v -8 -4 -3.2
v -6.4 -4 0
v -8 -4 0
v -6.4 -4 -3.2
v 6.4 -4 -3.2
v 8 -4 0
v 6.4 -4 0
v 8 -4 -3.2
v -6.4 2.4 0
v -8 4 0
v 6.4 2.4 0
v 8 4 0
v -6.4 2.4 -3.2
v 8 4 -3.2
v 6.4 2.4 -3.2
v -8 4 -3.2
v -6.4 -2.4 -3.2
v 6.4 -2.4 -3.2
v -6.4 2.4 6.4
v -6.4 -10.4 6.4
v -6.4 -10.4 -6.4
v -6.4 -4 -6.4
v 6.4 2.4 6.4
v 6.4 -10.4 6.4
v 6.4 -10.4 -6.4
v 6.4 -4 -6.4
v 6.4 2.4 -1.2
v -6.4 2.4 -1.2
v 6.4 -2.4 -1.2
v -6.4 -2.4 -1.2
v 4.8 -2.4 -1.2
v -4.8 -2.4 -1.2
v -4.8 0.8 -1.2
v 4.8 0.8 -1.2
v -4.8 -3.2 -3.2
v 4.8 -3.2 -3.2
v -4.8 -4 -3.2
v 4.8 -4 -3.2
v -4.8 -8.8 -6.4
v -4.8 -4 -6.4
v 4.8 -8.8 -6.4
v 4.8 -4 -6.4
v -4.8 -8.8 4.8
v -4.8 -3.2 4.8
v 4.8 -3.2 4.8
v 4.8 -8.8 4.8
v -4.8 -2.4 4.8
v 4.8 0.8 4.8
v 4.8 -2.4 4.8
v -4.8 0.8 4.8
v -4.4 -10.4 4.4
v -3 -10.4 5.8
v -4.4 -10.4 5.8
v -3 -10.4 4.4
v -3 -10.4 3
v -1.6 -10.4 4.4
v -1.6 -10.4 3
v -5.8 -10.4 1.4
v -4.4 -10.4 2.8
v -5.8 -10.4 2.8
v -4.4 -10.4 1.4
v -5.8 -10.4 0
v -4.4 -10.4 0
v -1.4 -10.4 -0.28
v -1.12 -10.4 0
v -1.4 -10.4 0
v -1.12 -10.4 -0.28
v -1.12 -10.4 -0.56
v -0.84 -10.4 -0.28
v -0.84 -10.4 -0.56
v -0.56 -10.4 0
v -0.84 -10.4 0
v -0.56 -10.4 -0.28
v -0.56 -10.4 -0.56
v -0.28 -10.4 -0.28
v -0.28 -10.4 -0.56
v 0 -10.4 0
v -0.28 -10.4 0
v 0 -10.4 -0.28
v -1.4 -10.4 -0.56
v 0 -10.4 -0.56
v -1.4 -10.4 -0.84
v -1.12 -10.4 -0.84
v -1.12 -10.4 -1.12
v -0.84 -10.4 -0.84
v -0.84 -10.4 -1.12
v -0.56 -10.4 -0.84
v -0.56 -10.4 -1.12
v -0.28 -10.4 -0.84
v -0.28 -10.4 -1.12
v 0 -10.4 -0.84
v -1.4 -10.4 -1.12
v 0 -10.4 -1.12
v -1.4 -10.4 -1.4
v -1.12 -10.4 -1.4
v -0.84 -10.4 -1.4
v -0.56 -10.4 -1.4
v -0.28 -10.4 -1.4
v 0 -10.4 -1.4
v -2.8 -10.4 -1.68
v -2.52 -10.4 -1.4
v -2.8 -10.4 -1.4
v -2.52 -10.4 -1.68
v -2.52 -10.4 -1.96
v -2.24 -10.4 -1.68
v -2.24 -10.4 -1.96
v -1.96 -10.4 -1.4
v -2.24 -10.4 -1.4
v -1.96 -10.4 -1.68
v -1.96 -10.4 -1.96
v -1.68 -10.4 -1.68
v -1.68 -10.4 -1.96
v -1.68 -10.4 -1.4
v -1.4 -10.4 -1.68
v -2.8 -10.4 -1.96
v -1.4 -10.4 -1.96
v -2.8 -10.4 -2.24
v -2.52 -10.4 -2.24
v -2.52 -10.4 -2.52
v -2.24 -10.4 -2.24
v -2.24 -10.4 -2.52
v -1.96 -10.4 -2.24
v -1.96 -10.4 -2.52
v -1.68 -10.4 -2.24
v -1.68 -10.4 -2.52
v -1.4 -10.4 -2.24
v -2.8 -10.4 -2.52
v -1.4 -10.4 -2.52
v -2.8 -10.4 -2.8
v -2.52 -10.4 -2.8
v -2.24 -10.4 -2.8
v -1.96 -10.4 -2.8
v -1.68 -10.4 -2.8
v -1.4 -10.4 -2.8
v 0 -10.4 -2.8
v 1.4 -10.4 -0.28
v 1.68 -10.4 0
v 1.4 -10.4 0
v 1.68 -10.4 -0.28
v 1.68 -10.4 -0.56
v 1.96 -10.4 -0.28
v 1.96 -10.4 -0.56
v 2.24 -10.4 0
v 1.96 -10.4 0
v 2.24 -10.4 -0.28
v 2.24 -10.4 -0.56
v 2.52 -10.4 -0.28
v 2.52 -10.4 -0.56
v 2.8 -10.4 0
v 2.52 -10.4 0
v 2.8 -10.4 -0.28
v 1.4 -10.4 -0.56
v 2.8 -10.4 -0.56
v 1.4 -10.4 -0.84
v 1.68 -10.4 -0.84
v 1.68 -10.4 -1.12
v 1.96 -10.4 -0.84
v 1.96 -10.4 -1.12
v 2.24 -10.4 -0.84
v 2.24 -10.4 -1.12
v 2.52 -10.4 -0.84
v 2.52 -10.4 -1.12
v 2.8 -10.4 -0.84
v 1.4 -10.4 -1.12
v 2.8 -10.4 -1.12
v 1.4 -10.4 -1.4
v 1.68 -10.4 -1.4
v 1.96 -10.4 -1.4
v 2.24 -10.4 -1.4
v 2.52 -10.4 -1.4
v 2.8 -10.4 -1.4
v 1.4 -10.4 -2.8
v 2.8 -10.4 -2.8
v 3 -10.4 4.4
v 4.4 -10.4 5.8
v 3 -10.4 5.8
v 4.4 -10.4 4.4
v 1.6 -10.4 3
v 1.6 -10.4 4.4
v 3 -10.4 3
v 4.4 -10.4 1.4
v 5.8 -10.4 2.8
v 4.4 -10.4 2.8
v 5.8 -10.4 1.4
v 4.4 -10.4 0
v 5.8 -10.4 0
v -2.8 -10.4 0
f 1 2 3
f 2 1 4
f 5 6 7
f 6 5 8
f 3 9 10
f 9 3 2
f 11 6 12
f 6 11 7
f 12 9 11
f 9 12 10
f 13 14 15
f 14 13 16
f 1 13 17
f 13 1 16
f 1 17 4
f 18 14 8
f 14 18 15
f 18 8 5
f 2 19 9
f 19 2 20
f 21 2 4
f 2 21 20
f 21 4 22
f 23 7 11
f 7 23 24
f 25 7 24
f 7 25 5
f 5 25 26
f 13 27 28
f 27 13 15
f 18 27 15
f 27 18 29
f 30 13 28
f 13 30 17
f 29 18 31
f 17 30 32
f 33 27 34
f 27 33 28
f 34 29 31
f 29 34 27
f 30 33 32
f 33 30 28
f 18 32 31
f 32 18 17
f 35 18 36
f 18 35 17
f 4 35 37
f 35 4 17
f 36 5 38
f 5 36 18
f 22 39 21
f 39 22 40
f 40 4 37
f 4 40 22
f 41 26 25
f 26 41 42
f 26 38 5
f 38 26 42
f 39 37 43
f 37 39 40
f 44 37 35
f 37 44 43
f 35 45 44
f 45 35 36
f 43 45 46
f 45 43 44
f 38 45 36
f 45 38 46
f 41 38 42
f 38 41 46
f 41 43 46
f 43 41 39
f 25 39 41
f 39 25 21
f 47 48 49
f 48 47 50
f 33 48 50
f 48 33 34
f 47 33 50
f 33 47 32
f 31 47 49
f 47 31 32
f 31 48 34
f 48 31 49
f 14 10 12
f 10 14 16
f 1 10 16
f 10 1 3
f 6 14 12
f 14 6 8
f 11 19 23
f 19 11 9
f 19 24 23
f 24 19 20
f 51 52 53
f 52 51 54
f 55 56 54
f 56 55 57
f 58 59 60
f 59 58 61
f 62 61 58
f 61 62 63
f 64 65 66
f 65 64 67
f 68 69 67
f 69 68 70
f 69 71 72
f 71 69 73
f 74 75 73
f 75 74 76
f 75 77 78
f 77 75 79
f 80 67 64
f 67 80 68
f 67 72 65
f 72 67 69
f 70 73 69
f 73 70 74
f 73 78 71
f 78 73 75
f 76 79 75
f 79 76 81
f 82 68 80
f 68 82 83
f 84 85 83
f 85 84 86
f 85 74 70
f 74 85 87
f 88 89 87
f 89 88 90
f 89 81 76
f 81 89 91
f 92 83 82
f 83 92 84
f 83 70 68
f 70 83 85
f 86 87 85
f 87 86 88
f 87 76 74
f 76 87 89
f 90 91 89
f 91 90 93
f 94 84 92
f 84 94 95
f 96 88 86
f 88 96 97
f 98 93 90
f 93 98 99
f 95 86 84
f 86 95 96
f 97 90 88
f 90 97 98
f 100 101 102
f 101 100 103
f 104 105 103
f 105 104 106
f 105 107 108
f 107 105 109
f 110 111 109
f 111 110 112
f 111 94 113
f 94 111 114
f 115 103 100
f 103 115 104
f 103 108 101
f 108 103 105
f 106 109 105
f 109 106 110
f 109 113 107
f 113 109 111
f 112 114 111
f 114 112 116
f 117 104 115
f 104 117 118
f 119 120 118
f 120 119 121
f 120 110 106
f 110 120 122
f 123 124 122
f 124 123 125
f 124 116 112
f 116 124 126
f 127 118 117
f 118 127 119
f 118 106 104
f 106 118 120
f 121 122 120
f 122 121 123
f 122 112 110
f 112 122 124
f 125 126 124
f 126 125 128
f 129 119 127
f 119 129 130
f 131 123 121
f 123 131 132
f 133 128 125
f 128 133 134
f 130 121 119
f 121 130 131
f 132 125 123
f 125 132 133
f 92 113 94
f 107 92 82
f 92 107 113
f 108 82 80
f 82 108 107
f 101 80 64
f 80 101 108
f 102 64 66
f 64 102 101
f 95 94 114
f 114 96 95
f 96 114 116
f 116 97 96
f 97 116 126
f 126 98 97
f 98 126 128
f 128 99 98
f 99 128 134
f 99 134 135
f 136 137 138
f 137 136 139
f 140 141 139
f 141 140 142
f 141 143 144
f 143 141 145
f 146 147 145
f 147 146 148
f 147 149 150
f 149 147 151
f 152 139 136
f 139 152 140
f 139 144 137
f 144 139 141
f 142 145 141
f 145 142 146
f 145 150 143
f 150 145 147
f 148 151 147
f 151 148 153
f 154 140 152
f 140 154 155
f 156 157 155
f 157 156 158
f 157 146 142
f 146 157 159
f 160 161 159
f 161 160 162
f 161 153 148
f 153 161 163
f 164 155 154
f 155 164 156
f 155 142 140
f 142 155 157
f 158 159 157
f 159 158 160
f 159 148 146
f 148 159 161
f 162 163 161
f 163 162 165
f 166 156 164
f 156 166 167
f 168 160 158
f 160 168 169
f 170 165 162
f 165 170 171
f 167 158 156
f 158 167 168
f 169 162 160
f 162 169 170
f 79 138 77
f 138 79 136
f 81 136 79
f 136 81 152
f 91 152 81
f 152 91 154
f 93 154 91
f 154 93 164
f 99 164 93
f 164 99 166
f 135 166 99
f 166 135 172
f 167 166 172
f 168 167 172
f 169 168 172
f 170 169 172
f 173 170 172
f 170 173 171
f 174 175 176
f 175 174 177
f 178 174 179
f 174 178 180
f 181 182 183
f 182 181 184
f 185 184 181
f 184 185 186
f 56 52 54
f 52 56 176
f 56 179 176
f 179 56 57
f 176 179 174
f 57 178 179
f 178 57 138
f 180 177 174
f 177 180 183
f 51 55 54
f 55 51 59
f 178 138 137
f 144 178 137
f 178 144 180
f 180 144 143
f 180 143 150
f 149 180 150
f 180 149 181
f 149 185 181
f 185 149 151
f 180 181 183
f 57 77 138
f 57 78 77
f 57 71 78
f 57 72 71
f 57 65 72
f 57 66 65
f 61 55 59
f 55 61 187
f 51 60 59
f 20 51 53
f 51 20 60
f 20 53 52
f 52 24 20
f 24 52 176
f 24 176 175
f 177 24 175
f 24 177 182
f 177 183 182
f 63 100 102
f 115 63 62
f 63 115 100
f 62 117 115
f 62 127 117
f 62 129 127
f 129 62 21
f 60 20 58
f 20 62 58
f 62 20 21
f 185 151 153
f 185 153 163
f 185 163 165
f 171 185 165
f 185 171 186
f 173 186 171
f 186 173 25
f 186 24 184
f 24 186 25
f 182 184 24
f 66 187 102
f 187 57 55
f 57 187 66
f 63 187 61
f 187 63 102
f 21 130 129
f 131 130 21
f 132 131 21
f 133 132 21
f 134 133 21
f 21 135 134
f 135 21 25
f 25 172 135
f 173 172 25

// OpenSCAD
// file: ../p/rect3.scad
use <../lib.scad>
function ldraw_lib__rect3() = [
// 0 Rectangle with 3 Edges
// 0 Name: rect3.dat
// 0 Author: Mark Kennedy [mkennedy]
// 0 !LDRAW_ORG Primitive UPDATE 2010-01
// 0 !LICENSE Licensed under CC BY 4.0 : see CAreadme.txt
// 
// 0 BFC CERTIFY CCW
  [0,"BFC","CERTIFY"],
  [0,"BFC","CCW"],
// 
// 0 !HISTORY 2003-08-01 [PTadmin] Official Update 2003-02
// 0 !HISTORY 2007-06-24 [PTadmin] Header formatted for Contributor Agreement
// 0 !HISTORY 2008-07-01 [PTadmin] Official Update 2008-01
// 0 !HISTORY 2010-01-17 [mikeheide] Change winding to CCW
// 0 !HISTORY 2010-04-05 [PTadmin] Official Update 2010-01
// 
// 
// 2 24 1 0 1 -1 0 1
  [2,24,1,0,1,-1,0,1],
// 2 24 1 0 1 1 0 -1
  [2,24,1,0,1,1,0,-1],
// 2 24 -1 0 1 -1 0 -1
  [2,24,-1,0,1,-1,0,-1],
// 4 16 -1 0 1 -1 0 -1 1 0 -1 1 0 1
  [4,16,-1,0,1,-1,0,-1,1,0,-1,1,0,1],
// 0 //
];
module ldraw_lib__rect3(step=0, col=false, unit=2/5, alt=false, line=0.2, solid=!$preview)
    makepoly(ldraw_lib__rect3(), step=step, col=col, unit=unit, alt=alt, line=line, solid=solid);
ldraw_lib__rect3(line=0.2);
// file: ../p/rect.scad
use <../lib.scad>
function ldraw_lib__rect() = [
// 0 Rectangle
// 0 Name: rect.dat
// 0 Author: James Jessiman
// 0 !LDRAW_ORG Primitive UPDATE 2010-01
// 0 !LICENSE Licensed under CC BY 4.0 : see CAreadme.txt
// 
// 0 BFC CERTIFY CCW
  [0,"BFC","CERTIFY"],
  [0,"BFC","CCW"],
// 
// 0 !HISTORY 2002-04-05 [hafhead] Added BFC statement
// 0 !HISTORY 2002-04-25 [PTadmin] Official Update 2002-02
// 0 !HISTORY 2007-06-24 [PTadmin] Header formatted for Contributor Agreement
// 0 !HISTORY 2008-07-01 [PTadmin] Official Update 2008-01
// 0 !HISTORY 2010-01-17 [mikeheide] changed winding to CCW
// 0 !HISTORY 2010-04-05 [PTadmin] Official Update 2010-01
// 
// 
// 2 24 1 0 1 -1 0 1
  [2,24,1,0,1,-1,0,1],
// 2 24 -1 0 1 -1 0 -1
  [2,24,-1,0,1,-1,0,-1],
// 2 24 -1 0 -1 1 0 -1
  [2,24,-1,0,-1,1,0,-1],
// 2 24 1 0 -1 1 0 1
  [2,24,1,0,-1,1,0,1],
// 4 16 -1 0 1 -1 0 -1 1 0 -1 1 0 1
  [4,16,-1,0,1,-1,0,-1,1,0,-1,1,0,1],
// 0
];
module ldraw_lib__rect(step=0, col=false, unit=2/5, alt=false, line=0.2, solid=!$preview)
    makepoly(ldraw_lib__rect(), step=step, col=col, unit=unit, alt=alt, line=line, solid=solid);
ldraw_lib__rect(line=0.2);
// file: ../p/box5-1.scad
use <../lib.scad>
function ldraw_lib__box5_1() = [
// 0 Box with 5 Faces without 1 Edge
// 0 Name: box5-1.dat
// 0 Author: J.C. Tchang [tchang]
// 0 !LDRAW_ORG Primitive UPDATE 2014-01
// 0 !LICENSE Licensed under CC BY 4.0 : see CAreadme.txt
// 
// 0 BFC CERTIFY CCW
  [0,"BFC","CERTIFY"],
  [0,"BFC","CCW"],
// 
// 0 !HISTORY 2014-06-21 [PTadmin] Official Update 2014-01
// 
// 
// 2 24 1 1 1 -1 1 1
  [2,24,1,1,1,-1,1,1],
// 2 24 -1 1 1 -1 1 -1
  [2,24,-1,1,1,-1,1,-1],
// 2 24 -1 1 -1 1 1 -1
  [2,24,-1,1,-1,1,1,-1],
// 2 24 1 1 -1 1 1 1
  [2,24,1,1,-1,1,1,1],
// 2 24 1 0 1 -1 0 1
  [2,24,1,0,1,-1,0,1],
// 2 24 -1 0 1 -1 0 -1
  [2,24,-1,0,1,-1,0,-1],
// 2 24 1 0 -1 1 0 1
  [2,24,1,0,-1,1,0,1],
// 2 24 1 0 1 1 1 1
  [2,24,1,0,1,1,1,1],
// 2 24 -1 0 1 -1 1 1
  [2,24,-1,0,1,-1,1,1],
// 2 24 1 0 -1 1 1 -1
  [2,24,1,0,-1,1,1,-1],
// 2 24 -1 0 -1 -1 1 -1
  [2,24,-1,0,-1,-1,1,-1],
// 4 16 -1 1 1 1 1 1 1 1 -1 -1 1 -1
  [4,16,-1,1,1,1,1,1,1,1,-1,-1,1,-1],
// 4 16 -1 1 1 -1 0 1 1 0 1 1 1 1
  [4,16,-1,1,1,-1,0,1,1,0,1,1,1,1],
// 4 16 -1 1 -1 -1 0 -1 -1 0 1 -1 1 1
  [4,16,-1,1,-1,-1,0,-1,-1,0,1,-1,1,1],
// 4 16 1 1 -1 1 0 -1 -1 0 -1 -1 1 -1
  [4,16,1,1,-1,1,0,-1,-1,0,-1,-1,1,-1],
// 4 16 1 1 1 1 0 1 1 0 -1 1 1 -1
  [4,16,1,1,1,1,0,1,1,0,-1,1,1,-1],
];
module ldraw_lib__box5_1(step=0, col=false, unit=2/5, alt=false, line=0.2, solid=!$preview)
    makepoly(ldraw_lib__box5_1(), step=step, col=col, unit=unit, alt=alt, line=line, solid=solid);
ldraw_lib__box5_1(line=0.2);
// file: ../p/box3u2p.scad
use <../lib.scad>
function ldraw_lib__box3u2p() = [
// 0 Box with 3 Faces without 2 Parallel Edges
// 0 Name: box3u2p.dat
// 0 Author: Niels Karsdorp [nielsk]
// 0 !LDRAW_ORG Primitive UPDATE 2012-01
// 0 !LICENSE Licensed under CC BY 4.0 : see CAreadme.txt
// 
// 0 BFC CERTIFY CCW
  [0,"BFC","CERTIFY"],
  [0,"BFC","CCW"],
// 
// 0 !HISTORY 2003-03-12 [PTadmin] Official Update 2003-01
// 0 !HISTORY 2007-06-24 [PTadmin] Header formatted for Contributor Agreement
// 0 !HISTORY 2008-07-01 [PTadmin] Official Update 2008-01
// 0 !HISTORY 2012-02-16 [Philo] Changed to CCW
// 0 !HISTORY 2012-03-30 [PTadmin] Official Update 2012-01
// 
// 
// 2 24 1 1 1 -1 1 1
  [2,24,1,1,1,-1,1,1],
// 2 24 -1 1 -1 1 1 -1
  [2,24,-1,1,-1,1,1,-1],
// 2 24 1 0 1 -1 0 1
  [2,24,1,0,1,-1,0,1],
// 2 24 -1 0 -1 1 0 -1
  [2,24,-1,0,-1,1,0,-1],
// 2 24 1 1 1 1 1 -1
  [2,24,1,1,1,1,1,-1],
// 2 24 -1 1 1 -1 1 -1
  [2,24,-1,1,1,-1,1,-1],
// 2 24 1 1 1 1 0 1
  [2,24,1,1,1,1,0,1],
// 2 24 1 1 -1 1 0 -1
  [2,24,1,1,-1,1,0,-1],
// 2 24 -1 1 1 -1 0 1
  [2,24,-1,1,1,-1,0,1],
// 2 24 -1 1 -1 -1 0 -1
  [2,24,-1,1,-1,-1,0,-1],
// 4 16 -1 1 -1 -1 1 1 1 1 1 1 1 -1
  [4,16,-1,1,-1,-1,1,1,1,1,1,1,1,-1],
// 4 16 -1 1 1 -1 0 1 1 0 1 1 1 1
  [4,16,-1,1,1,-1,0,1,1,0,1,1,1,1],
// 4 16 1 1 -1 1 0 -1 -1 0 -1 -1 1 -1
  [4,16,1,1,-1,1,0,-1,-1,0,-1,-1,1,-1],
];
module ldraw_lib__box3u2p(step=0, col=false, unit=2/5, alt=false, line=0.2, solid=!$preview)
    makepoly(ldraw_lib__box3u2p(), step=step, col=col, unit=unit, alt=alt, line=line, solid=solid);
ldraw_lib__box3u2p(line=0.2);
// file: ../p/box2-5.scad
use <../lib.scad>
function ldraw_lib__box2_5() = [
// 0 Box with 2 Faces without 5 Edges
// 0 Name: box2-5.dat
// 0 Author: Steffen [Steffen]
// 0 !LDRAW_ORG Primitive UPDATE 2003-03
// 0 !LICENSE Licensed under CC BY 4.0 : see CAreadme.txt
// 
// 0 BFC CERTIFY CCW
  [0,"BFC","CERTIFY"],
  [0,"BFC","CCW"],
// 
// 0 !HISTORY 2003-12-19 [PTadmin] Official Update 2003-03
// 0 !HISTORY 2007-06-24 [PTadmin] Header formatted for Contributor Agreement
// 0 !HISTORY 2008-07-01 [PTadmin] Official Update 2008-01
// 
// 
// 2 24 1 1 1 -1 1 1
  [2,24,1,1,1,-1,1,1],
// 2 24 1 1 -1 -1 1 -1
  [2,24,1,1,-1,-1,1,-1],
// 2 24 1 -1 1 -1 -1 1
  [2,24,1,-1,1,-1,-1,1],
// 2 24 -1 -1 1 -1 1 1
  [2,24,-1,-1,1,-1,1,1],
// 2 24 1 -1 1 1 1 1
  [2,24,1,-1,1,1,1,1],
// 2 24 -1 1 -1 -1 1 1
  [2,24,-1,1,-1,-1,1,1],
// 2 24 1 1 -1 1 1 1
  [2,24,1,1,-1,1,1,1],
// 4 16 1 1 1 1 1 -1 -1 1 -1 -1 1 1
  [4,16,1,1,1,1,1,-1,-1,1,-1,-1,1,1],
// 4 16 1 1 1 -1 1 1 -1 -1 1 1 -1 1
  [4,16,1,1,1,-1,1,1,-1,-1,1,1,-1,1],
// 0
];
module ldraw_lib__box2_5(step=0, col=false, unit=2/5, alt=false, line=0.2, solid=!$preview)
    makepoly(ldraw_lib__box2_5(), step=step, col=col, unit=unit, alt=alt, line=line, solid=solid);
ldraw_lib__box2_5(line=0.2);
// file: s/19727s01.scad
use <../../lib.scad>
use <../../p/box2-5.scad>
use <../../p/box3u2p.scad>
use <../../p/box5-1.scad>
use <../../p/rect.scad>
use <../../p/rect3.scad>
function ldraw_lib__s__19727s01() = [
// 0 ~Plate  1 x  2 with Cube without Front
// 0 Name: s\19727s01.dat
// 0 Author: Merlijn Wissink [legolijntje]
// 0 !LDRAW_ORG Subpart UPDATE 2016-01
// 0 !LICENSE Licensed under CC BY 2.0 and CC BY 4.0 : see CAreadme.txt
// 
// 0 BFC CERTIFY CCW
  [0,"BFC","CERTIFY"],
  [0,"BFC","CCW"],
// 
// 0 !HISTORY 2016-03-18 {LEGO Digital Designer} Original part shape
// 0 !HISTORY 2016-06-18 [legolijntje] File preparation for LDraw Parts Tracker
// 0 !HISTORY 2016-12-31 [PTadmin] Official Update 2016-01
// 
// 
// 1 16 -18 4 -10 0 0 2 4 0 0 0 1 0 rect3.dat
  [1,16,-18,4,-10,0,0,2,4,0,0,0,1,0, ldraw_lib__rect3()],
// 1 16 18 4 -10 0 0 -2 -4 0 0 0 1 0 rect3.dat
  [1,16,18,4,-10,0,0,-2,-4,0,0,0,1,0, ldraw_lib__rect3()],
// 4 16 -20 0 10 -20 0 -10 -16 0 -10 -16 0 6
  [4,16,-20,0,10,-20,0,-10,-16,0,-10,-16,0,6],
// 4 16 16 0 -10 20 0 -10 20 0 10 16 0 6
  [4,16,16,0,-10,20,0,-10,20,0,10,16,0,6],
// 4 16 -16 0 6 16 0 6 20 0 10 -20 0 10
  [4,16,-16,0,6,16,0,6,20,0,10,-20,0,10],
// 4 16 20 8 10 16 8 6 -16 8 6 -20 8 10
  [4,16,20,8,10,16,8,6,-16,8,6,-20,8,10],
// 4 16 -20 8 -10 -20 8 10 -16 8 6 -16 8 -6
  [4,16,-20,8,-10,-20,8,10,-16,8,6,-16,8,-6],
// 3 16 -20 8 -10 -16 8 -6 -16 8 -10
  [3,16,-20,8,-10,-16,8,-6,-16,8,-10],
// 4 16 16 8 6 20 8 10 20 8 -10 16 8 -6
  [4,16,16,8,6,20,8,10,20,8,-10,16,8,-6],
// 3 16 16 8 -6 20 8 -10 16 8 -10
  [3,16,16,8,-6,20,8,-10,16,8,-10],
// 4 16 -16 -16 -26 -16 -16 6 -16 0 6 -16 0 -10
  [4,16,-16,-16,-26,-16,-16,6,-16,0,6,-16,0,-10],
// 4 16 -16 0 -10 -16 8 -10 -16 16 -26 -16 -16 -26
  [4,16,-16,0,-10,-16,8,-10,-16,16,-26,-16,-16,-26],
// 3 16 -16 16 -26 -16 8 -10 -16 16 -10
  [3,16,-16,16,-26,-16,8,-10,-16,16,-10],
// 4 16 16 0 6 16 -16 6 16 -16 -26 16 0 -10
  [4,16,16,0,6,16,-16,6,16,-16,-26,16,0,-10],
// 4 16 16 16 -26 16 8 -10 16 0 -10 16 -16 -26
  [4,16,16,16,-26,16,8,-10,16,0,-10,16,-16,-26],
// 3 16 16 8 -10 16 16 -26 16 16 -10
  [3,16,16,8,-10,16,16,-26,16,16,-10],
// 1 16 0 5.5 6 16 0 0 0 0 -2.5 0 1 0 rect.dat
  [1,16,0,5.5,6,16,0,0,0,0,-2.5,0,1,0, ldraw_lib__rect()],
// 1 16 16 5.5 0 0 1 0 2.5 0 0 0 0 -6 rect.dat
  [1,16,16,5.5,0,0,1,0,2.5,0,0,0,0,-6, ldraw_lib__rect()],
// 1 16 -16 5.5 0 0 -1 0 0 0 -2.5 6 0 0 rect.dat
  [1,16,-16,5.5,0,0,-1,0,0,0,-2.5,6,0,0, ldraw_lib__rect()],
// 3 16 16 3 -6 16 8 -6 12 3 -6
  [3,16,16,3,-6,16,8,-6,12,3,-6],
// 3 16 -16 8 -6 -16 3 -6 -12 3 -6
  [3,16,-16,8,-6,-16,3,-6,-12,3,-6],
// 4 16 -16 3 6 16 3 6 12 3 2 -12 3 2
  [4,16,-16,3,6,16,3,6,12,3,2,-12,3,2],
// 4 16 16 3 6 16 3 -6 12 3 -6 12 3 2
  [4,16,16,3,6,16,3,-6,12,3,-6,12,3,2],
// 4 16 -12 3 2 -12 3 -6 -16 3 -6 -16 3 6
  [4,16,-12,3,2,-12,3,-6,-16,3,-6,-16,3,6],
// 4 16 12 3 -6 16 8 -6 -16 8 -6 -12 3 -6
  [4,16,12,3,-6,16,8,-6,-16,8,-6,-12,3,-6],
// 4 16 -16 8 -6 16 8 -6 12 8 -8 -12 8 -8
  [4,16,-16,8,-6,16,8,-6,12,8,-8,-12,8,-8],
// 4 16 -16 8 -10 -16 8 -6 -12 8 -8 -12 8 -10
  [4,16,-16,8,-10,-16,8,-6,-12,8,-8,-12,8,-10],
// 4 16 12 8 -8 16 8 -6 16 8 -10 12 8 -10
  [4,16,12,8,-8,16,8,-6,16,8,-10,12,8,-10],
// 4 16 -12 16 -22 -16 16 -26 -16 16 -10 -12 16 -10
  [4,16,-12,16,-22,-16,16,-26,-16,16,-10,-12,16,-10],
// 1 16 -14 12 -10 2 0 0 0 0 4 0 -1 0 rect.dat
  [1,16,-14,12,-10,2,0,0,0,0,4,0,-1,0, ldraw_lib__rect()],
// 4 16 16 16 -10 16 16 -26 12 16 -22 12 16 -10
  [4,16,16,16,-10,16,16,-26,12,16,-22,12,16,-10],
// 1 16 14 12 -10 2 0 0 0 0 4 0 -1 0 rect.dat
  [1,16,14,12,-10,2,0,0,0,0,4,0,-1,0, ldraw_lib__rect()],
// 4 16 -12 16 -22 -12 16 -10 -12 8 -10 -12 -12 -22
  [4,16,-12,16,-22,-12,16,-10,-12,8,-10,-12,-12,-22],
// 4 16 -12 -12 -22 -12 8 -10 -12 8 -8 -12 -12 -8
  [4,16,-12,-12,-22,-12,8,-10,-12,8,-8,-12,-12,-8],
// 1 16 0 -2 -8 0 0 12 10 0 0 0 1 0 rect.dat
  [1,16,0,-2,-8,0,0,12,10,0,0,0,1,0, ldraw_lib__rect()],
// 1 16 0 -12 -15 0 0 12 0 -1 0 7 0 0 rect.dat
  [1,16,0,-12,-15,0,0,12,0,-1,0,7,0,0, ldraw_lib__rect()],
// 4 16 12 -12 -8 12 8 -8 12 8 -10 12 -12 -22
  [4,16,12,-12,-8,12,8,-8,12,8,-10,12,-12,-22],
// 4 16 12 16 -22 12 -12 -22 12 8 -10 12 16 -10
  [4,16,12,16,-22,12,-12,-22,12,8,-10,12,16,-10],
// 1 16 0 2 -22 12 0 0 0 0 14 0 -1 0 rect3.dat
  [1,16,0,2,-22,12,0,0,0,0,14,0,-1,0, ldraw_lib__rect3()],
// 4 16 -16 16 -26 -12 16 -22 12 16 -22 16 16 -26
  [4,16,-16,16,-26,-12,16,-22,12,16,-22,16,16,-26],
// 2 24 -16 -16 -26 -16 16 -26
  [2,24,-16,-16,-26,-16,16,-26],
// 2 24 -16 16 -26 16 16 -26
  [2,24,-16,16,-26,16,16,-26],
// 2 24 16 16 -26 16 -16 -26
  [2,24,16,16,-26,16,-16,-26],
// 2 24 16 16 -26 16 16 -10
  [2,24,16,16,-26,16,16,-10],
// 2 24 -16 16 -10 -16 16 -26
  [2,24,-16,16,-10,-16,16,-26],
// 2 24 -12 16 -10 -12 16 -22
  [2,24,-12,16,-10,-12,16,-22],
// 2 24 12 16 -22 12 16 -10
  [2,24,12,16,-22,12,16,-10],
// 2 24 16 0 -10 16 0 6
  [2,24,16,0,-10,16,0,6],
// 2 24 -16 0 6 -16 0 -10
  [2,24,-16,0,6,-16,0,-10],
// 2 24 -12 8 -8 -12 8 -10
  [2,24,-12,8,-8,-12,8,-10],
// 2 24 12 8 -8 12 8 -10
  [2,24,12,8,-8,12,8,-10],
// 2 24 -16 8 -6 16 8 -6
  [2,24,-16,8,-6,16,8,-6],
// 2 24 -12 3 -6 -16 3 -6
  [2,24,-12,3,-6,-16,3,-6],
// 2 24 12 3 -6 16 3 -6
  [2,24,12,3,-6,16,3,-6],
// 0 BFC INVERTNEXT
  [0,"BFC","INVERTNEXT"],
// 1 16 0 3 -2 12 0 0 0 -15 0 0 0 4 box5-1.dat
  [1,16,0,3,-2,12,0,0,0,-15,0,0,0,4, ldraw_lib__box5_1()],
// 1 16 0 4 -10 0 0 -20 -4 0 0 0 20 0 box3u2p.dat
  [1,16,0,4,-10,0,0,-20,-4,0,0,0,20,0, ldraw_lib__box3u2p()],
// 1 16 0 -8 -10 16 0 0 0 0 -8 0 16 0 box2-5.dat
  [1,16,0,-8,-10,16,0,0,0,0,-8,0,16,0, ldraw_lib__box2_5()],
];
module ldraw_lib__s__19727s01(step=0, col=false, unit=2/5, alt=false, line=0.2, solid=!$preview)
    makepoly(ldraw_lib__s__19727s01(), step=step, col=col, unit=unit, alt=alt, line=line, solid=solid);
ldraw_lib__s__19727s01(line=0.2);
// main file
use <../lib.scad>
use <s/19727p01s01.scad>
use <s/19727s01.scad>
function ldraw_lib__19727p05() = [
// 0 Plate  1 x  2 with Cube with Minecraft Spider Pattern
// 0 Name: 19727p05.dat
// 0 Author: Vincent Messenet [Cheenzo]
// 0 !LDRAW_ORG Part UPDATE 2024-03
// 0 !LICENSE Licensed under CC BY 4.0 : see CAreadme.txt
// 
// 0 BFC CERTIFY CCW
  [0,"BFC","CERTIFY"],
  [0,"BFC","CCW"],
// 
// 0 !KEYWORDS Bricklink 19727pb001, Rebrickable 19727pr0005, Set 21113, Set 21118
// 0 !KEYWORDS Set 21131, Set 21166, Set 21179
// 
// 0 !HISTORY 2024-04-28 [OrionP] Official Update 2024-03
// 
// 
// 1 16 0 0 0 1 0 0 0 1 0 0 0 1 s\19727s01.dat
  [1,16,0,0,0,1,0,0,0,1,0,0,0,1, ldraw_lib__s__19727s01()],
// 1 16 0 0 0 1 0 0 0 1 0 0 0 1 s\19727p01s01.dat
  [1,16,0,0,0,1,0,0,0,1,0,0,0,1, ldraw_lib__s__19727p01s01()],
// 
// 3 16 -16 16 -26 -6.3 7 -26 -7 7 -26
  [3,16,-16,16,-26,-6.3,7,-26,-7,7,-26],
// 3 16 -5.6 7 -26 -6.3 7 -26 -16 16 -26
  [3,16,-5.6,7,-26,-6.3,7,-26,-16,16,-26],
// 3 16 -4.9 7 -26 -5.6 7 -26 -16 16 -26
  [3,16,-4.9,7,-26,-5.6,7,-26,-16,16,-26],
// 3 16 -4.2 7 -26 -4.9 7 -26 -16 16 -26
  [3,16,-4.2,7,-26,-4.9,7,-26,-16,16,-26],
// 3 16 -3.5 7 -26 -4.2 7 -26 -16 16 -26
  [3,16,-3.5,7,-26,-4.2,7,-26,-16,16,-26],
// 4 16 -3.5 7 -26 -16 16 -26 16 16 -26 0 7 -26
  [4,16,-3.5,7,-26,-16,16,-26,16,16,-26,0,7,-26],
// 3 16 16 16 -26 3.5 7 -26 0 7 -26
  [3,16,16,16,-26,3.5,7,-26,0,7,-26],
// 3 16 7 7 -26 3.5 7 -26 16 16 -26
  [3,16,7,7,-26,3.5,7,-26,16,16,-26],
];
module ldraw_lib__19727p05(step=0, col=false, unit=2/5, alt=false, line=0.2, solid=!$preview)
    makepoly(ldraw_lib__19727p05(), step=step, col=col, unit=unit, alt=alt, line=line, solid=solid);
ldraw_lib__19727p05(line=0.2);
